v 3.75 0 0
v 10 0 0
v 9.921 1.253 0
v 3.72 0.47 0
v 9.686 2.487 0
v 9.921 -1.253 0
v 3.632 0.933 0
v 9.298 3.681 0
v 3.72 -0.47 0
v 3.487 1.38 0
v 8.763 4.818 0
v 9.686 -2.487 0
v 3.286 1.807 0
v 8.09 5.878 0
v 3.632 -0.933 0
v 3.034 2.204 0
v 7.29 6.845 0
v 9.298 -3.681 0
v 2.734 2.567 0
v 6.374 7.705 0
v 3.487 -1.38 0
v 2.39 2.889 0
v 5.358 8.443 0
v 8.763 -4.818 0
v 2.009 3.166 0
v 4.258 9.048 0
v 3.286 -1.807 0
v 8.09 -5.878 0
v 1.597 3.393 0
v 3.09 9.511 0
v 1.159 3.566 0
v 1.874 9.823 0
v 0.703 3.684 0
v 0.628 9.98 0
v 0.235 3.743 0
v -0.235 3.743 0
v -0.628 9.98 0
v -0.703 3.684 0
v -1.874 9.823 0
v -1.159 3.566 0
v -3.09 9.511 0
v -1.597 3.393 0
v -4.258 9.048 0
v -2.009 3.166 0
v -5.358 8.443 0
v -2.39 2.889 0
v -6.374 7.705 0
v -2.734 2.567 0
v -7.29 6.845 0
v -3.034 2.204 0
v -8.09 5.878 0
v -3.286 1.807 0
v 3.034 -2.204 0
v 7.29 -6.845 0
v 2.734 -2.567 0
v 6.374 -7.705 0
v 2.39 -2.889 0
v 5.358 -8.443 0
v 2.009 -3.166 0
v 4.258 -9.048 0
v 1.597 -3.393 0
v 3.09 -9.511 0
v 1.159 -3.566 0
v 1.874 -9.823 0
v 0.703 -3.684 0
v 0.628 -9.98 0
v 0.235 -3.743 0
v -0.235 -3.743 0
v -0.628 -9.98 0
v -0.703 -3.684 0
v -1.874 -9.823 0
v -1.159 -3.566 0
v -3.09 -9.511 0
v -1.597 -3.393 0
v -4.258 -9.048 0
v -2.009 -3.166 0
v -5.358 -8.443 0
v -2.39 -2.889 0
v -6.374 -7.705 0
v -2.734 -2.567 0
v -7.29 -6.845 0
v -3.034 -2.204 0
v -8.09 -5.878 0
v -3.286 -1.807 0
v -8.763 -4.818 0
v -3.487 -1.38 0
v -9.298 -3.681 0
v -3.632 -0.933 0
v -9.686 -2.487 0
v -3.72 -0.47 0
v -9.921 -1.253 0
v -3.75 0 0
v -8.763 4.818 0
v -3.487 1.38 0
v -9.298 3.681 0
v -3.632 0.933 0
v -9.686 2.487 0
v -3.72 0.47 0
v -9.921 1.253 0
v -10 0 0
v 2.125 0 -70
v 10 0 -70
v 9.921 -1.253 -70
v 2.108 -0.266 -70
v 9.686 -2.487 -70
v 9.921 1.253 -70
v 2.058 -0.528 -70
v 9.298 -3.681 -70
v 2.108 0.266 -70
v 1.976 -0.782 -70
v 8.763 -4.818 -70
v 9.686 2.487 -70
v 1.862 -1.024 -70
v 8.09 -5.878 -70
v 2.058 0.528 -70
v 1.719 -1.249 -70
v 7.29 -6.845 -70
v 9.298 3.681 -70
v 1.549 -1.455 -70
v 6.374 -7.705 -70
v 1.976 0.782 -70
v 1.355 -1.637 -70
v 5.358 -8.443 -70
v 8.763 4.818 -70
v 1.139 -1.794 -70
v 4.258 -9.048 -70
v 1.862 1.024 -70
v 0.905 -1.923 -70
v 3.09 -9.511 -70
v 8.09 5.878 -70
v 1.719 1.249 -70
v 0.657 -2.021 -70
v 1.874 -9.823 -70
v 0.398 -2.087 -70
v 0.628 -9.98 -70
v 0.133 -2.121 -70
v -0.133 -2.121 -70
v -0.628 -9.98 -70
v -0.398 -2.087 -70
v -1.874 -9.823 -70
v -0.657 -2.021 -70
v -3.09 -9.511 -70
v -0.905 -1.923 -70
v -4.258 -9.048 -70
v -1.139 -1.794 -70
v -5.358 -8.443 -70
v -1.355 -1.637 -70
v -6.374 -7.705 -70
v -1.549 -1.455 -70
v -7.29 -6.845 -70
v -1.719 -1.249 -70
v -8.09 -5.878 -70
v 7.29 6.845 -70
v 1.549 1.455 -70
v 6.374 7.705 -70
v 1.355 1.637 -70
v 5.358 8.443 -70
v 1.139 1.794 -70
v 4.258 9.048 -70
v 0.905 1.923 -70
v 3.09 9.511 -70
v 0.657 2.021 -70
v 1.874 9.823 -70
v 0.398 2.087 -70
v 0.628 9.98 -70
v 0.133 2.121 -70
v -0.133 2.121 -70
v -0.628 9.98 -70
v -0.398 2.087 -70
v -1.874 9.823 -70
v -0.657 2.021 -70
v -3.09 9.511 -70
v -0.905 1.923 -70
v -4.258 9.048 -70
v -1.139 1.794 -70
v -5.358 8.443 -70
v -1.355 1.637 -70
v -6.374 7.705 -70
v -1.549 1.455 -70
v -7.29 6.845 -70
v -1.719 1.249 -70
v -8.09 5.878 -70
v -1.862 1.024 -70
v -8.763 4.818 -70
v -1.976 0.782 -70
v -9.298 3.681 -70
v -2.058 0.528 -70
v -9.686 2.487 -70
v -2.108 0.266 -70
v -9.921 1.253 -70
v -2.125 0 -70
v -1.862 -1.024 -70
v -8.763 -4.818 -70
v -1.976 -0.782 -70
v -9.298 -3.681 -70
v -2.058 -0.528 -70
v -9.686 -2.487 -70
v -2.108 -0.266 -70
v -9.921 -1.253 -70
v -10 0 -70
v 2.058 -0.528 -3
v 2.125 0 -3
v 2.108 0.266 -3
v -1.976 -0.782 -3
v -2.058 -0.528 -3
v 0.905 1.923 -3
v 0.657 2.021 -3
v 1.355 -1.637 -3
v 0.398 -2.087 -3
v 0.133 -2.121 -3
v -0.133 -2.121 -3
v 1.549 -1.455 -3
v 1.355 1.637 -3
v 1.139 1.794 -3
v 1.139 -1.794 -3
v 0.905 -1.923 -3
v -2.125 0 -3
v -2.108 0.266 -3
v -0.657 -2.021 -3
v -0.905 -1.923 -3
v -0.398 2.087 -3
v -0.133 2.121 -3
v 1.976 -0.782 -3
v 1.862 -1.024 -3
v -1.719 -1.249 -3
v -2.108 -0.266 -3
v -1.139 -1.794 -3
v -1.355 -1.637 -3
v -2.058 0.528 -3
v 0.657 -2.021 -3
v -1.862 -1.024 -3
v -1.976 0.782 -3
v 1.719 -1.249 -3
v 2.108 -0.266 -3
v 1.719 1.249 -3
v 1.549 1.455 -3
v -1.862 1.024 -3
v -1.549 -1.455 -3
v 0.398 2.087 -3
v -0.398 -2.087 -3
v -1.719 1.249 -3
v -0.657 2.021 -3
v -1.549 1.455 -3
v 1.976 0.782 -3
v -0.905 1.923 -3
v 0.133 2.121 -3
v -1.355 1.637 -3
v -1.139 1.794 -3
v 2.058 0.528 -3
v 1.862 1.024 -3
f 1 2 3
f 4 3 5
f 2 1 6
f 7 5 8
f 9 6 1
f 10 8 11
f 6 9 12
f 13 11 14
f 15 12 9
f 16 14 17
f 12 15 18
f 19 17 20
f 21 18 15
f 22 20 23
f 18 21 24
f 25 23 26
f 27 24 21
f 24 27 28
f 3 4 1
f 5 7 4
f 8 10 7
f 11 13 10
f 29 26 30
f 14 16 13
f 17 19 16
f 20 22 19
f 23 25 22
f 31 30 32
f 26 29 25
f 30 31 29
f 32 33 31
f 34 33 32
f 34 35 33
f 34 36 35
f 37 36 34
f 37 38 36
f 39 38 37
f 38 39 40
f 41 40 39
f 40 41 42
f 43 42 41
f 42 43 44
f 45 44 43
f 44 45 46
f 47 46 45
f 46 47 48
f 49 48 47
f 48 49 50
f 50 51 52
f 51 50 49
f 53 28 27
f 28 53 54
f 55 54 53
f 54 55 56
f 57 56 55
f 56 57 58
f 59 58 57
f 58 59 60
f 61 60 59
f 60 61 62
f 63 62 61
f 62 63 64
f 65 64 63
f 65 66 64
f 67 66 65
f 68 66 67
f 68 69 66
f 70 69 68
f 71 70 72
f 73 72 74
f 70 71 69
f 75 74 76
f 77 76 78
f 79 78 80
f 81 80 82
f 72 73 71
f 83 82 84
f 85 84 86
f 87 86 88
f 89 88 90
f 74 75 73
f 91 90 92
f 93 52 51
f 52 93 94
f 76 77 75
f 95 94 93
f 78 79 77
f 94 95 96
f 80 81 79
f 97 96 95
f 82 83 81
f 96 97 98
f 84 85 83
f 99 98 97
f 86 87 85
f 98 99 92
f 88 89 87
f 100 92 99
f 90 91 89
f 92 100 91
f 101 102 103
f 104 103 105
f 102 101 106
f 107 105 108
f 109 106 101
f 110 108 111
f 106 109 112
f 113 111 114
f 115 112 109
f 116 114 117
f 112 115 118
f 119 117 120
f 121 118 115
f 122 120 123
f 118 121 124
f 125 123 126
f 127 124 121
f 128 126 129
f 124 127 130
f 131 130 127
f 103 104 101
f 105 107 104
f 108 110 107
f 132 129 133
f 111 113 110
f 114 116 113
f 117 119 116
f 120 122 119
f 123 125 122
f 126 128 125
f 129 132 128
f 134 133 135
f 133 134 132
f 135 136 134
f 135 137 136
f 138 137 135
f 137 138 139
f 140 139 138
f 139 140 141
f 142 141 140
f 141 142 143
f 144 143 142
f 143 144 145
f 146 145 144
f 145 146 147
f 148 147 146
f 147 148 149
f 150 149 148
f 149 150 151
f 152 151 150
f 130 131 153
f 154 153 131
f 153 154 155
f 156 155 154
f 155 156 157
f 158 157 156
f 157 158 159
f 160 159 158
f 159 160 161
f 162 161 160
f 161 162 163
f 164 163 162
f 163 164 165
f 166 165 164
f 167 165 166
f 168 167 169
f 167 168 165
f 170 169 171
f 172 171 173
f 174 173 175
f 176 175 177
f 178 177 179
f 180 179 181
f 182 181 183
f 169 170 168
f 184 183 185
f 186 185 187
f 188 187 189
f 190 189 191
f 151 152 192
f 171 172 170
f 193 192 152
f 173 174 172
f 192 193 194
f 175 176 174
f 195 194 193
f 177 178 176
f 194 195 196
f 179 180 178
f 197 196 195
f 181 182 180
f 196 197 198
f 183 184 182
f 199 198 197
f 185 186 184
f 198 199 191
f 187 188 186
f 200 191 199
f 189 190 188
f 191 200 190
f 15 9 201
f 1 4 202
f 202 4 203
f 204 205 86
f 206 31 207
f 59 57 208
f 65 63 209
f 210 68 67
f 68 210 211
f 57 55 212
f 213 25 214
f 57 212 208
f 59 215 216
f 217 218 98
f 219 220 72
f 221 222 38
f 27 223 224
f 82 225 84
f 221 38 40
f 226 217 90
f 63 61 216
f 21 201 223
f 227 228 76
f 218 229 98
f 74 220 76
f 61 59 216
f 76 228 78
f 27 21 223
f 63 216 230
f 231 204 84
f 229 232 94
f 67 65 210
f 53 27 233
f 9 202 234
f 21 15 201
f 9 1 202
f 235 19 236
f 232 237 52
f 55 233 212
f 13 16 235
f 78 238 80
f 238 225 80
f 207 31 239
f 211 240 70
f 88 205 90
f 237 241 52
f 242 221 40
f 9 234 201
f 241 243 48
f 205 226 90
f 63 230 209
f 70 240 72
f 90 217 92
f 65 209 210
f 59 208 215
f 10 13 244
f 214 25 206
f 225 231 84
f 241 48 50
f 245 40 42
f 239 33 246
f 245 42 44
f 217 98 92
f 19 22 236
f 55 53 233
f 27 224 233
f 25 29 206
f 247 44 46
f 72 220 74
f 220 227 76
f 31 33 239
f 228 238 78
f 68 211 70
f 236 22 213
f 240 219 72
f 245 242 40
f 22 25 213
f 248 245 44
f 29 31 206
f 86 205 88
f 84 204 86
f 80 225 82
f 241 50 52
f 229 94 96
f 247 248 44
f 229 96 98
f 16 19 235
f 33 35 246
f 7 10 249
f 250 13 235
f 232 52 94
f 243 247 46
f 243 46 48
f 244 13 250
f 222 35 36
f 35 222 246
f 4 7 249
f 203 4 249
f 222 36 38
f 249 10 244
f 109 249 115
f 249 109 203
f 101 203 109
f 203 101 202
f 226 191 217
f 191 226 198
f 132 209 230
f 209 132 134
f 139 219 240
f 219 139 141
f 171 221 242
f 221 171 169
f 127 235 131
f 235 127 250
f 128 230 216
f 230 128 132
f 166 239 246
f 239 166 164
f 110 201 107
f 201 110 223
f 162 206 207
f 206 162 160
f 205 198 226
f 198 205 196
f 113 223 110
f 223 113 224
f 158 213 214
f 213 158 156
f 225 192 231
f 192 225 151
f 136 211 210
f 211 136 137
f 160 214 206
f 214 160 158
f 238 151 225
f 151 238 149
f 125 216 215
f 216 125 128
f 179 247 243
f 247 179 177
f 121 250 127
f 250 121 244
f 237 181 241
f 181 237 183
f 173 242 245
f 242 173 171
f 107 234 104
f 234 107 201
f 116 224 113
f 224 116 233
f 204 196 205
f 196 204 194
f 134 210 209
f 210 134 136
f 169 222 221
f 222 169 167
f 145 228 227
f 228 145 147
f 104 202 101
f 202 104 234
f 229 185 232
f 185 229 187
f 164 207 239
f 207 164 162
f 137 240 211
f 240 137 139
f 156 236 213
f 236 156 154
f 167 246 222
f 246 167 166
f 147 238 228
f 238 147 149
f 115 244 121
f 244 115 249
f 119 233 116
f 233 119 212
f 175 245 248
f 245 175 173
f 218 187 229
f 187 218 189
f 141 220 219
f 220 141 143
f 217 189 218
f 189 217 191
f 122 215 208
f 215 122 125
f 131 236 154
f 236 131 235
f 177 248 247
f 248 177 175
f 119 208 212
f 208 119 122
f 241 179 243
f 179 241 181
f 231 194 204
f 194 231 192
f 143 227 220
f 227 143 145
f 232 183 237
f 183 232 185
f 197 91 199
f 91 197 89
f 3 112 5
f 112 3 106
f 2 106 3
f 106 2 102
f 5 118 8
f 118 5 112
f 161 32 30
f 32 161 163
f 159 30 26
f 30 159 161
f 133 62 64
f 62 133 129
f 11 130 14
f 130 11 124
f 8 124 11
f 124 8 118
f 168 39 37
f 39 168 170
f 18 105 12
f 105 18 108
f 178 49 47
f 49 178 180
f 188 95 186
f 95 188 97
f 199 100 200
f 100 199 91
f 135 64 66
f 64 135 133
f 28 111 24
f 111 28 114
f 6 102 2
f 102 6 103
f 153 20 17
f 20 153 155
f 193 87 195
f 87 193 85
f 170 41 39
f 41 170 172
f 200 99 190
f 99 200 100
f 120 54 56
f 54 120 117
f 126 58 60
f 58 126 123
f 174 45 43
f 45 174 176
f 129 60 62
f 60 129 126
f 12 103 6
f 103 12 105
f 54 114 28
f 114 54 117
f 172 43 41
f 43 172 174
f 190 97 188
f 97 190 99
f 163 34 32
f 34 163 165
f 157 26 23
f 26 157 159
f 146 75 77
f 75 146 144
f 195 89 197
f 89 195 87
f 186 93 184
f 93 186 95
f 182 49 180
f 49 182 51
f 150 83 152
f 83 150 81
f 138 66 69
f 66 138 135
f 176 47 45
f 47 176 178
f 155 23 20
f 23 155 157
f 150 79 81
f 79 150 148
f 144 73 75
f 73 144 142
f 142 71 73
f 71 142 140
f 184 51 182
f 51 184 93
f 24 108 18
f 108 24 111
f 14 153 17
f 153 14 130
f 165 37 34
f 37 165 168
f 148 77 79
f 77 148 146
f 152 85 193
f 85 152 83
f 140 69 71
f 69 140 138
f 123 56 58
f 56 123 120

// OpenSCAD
$fn = 50;


difference() {
	union() {
		translate(v = [0, 0, -70.0000000000]) {
			cylinder(h = 70, r = 10.0000000000);
		}
	}
	union() {
		translate(v = [0, 0, 0]) {
			rotate(a = [0, 0, 0]) {
				difference() {
					union() {
						#translate(v = [0, 0, -70.0000000000]) {
							cylinder(h = 70, r = 2.0000000000);
						}
						#translate(v = [0, 0, -3]) {
							cylinder(h = 3, r = 10.0000000000, r1 = 2.1250000000, r2 = 3.7500000000);
						}
						#translate(v = [0, 0, -70.0000000000]) {
							cylinder(h = 70, r = 2.1250000000);
						}
						#translate(v = [0, 0, -70.0000000000]) {
							cylinder(h = 70, r = 2.0000000000);
						}
					}
					union();
				}
			}
		}
	}
}
